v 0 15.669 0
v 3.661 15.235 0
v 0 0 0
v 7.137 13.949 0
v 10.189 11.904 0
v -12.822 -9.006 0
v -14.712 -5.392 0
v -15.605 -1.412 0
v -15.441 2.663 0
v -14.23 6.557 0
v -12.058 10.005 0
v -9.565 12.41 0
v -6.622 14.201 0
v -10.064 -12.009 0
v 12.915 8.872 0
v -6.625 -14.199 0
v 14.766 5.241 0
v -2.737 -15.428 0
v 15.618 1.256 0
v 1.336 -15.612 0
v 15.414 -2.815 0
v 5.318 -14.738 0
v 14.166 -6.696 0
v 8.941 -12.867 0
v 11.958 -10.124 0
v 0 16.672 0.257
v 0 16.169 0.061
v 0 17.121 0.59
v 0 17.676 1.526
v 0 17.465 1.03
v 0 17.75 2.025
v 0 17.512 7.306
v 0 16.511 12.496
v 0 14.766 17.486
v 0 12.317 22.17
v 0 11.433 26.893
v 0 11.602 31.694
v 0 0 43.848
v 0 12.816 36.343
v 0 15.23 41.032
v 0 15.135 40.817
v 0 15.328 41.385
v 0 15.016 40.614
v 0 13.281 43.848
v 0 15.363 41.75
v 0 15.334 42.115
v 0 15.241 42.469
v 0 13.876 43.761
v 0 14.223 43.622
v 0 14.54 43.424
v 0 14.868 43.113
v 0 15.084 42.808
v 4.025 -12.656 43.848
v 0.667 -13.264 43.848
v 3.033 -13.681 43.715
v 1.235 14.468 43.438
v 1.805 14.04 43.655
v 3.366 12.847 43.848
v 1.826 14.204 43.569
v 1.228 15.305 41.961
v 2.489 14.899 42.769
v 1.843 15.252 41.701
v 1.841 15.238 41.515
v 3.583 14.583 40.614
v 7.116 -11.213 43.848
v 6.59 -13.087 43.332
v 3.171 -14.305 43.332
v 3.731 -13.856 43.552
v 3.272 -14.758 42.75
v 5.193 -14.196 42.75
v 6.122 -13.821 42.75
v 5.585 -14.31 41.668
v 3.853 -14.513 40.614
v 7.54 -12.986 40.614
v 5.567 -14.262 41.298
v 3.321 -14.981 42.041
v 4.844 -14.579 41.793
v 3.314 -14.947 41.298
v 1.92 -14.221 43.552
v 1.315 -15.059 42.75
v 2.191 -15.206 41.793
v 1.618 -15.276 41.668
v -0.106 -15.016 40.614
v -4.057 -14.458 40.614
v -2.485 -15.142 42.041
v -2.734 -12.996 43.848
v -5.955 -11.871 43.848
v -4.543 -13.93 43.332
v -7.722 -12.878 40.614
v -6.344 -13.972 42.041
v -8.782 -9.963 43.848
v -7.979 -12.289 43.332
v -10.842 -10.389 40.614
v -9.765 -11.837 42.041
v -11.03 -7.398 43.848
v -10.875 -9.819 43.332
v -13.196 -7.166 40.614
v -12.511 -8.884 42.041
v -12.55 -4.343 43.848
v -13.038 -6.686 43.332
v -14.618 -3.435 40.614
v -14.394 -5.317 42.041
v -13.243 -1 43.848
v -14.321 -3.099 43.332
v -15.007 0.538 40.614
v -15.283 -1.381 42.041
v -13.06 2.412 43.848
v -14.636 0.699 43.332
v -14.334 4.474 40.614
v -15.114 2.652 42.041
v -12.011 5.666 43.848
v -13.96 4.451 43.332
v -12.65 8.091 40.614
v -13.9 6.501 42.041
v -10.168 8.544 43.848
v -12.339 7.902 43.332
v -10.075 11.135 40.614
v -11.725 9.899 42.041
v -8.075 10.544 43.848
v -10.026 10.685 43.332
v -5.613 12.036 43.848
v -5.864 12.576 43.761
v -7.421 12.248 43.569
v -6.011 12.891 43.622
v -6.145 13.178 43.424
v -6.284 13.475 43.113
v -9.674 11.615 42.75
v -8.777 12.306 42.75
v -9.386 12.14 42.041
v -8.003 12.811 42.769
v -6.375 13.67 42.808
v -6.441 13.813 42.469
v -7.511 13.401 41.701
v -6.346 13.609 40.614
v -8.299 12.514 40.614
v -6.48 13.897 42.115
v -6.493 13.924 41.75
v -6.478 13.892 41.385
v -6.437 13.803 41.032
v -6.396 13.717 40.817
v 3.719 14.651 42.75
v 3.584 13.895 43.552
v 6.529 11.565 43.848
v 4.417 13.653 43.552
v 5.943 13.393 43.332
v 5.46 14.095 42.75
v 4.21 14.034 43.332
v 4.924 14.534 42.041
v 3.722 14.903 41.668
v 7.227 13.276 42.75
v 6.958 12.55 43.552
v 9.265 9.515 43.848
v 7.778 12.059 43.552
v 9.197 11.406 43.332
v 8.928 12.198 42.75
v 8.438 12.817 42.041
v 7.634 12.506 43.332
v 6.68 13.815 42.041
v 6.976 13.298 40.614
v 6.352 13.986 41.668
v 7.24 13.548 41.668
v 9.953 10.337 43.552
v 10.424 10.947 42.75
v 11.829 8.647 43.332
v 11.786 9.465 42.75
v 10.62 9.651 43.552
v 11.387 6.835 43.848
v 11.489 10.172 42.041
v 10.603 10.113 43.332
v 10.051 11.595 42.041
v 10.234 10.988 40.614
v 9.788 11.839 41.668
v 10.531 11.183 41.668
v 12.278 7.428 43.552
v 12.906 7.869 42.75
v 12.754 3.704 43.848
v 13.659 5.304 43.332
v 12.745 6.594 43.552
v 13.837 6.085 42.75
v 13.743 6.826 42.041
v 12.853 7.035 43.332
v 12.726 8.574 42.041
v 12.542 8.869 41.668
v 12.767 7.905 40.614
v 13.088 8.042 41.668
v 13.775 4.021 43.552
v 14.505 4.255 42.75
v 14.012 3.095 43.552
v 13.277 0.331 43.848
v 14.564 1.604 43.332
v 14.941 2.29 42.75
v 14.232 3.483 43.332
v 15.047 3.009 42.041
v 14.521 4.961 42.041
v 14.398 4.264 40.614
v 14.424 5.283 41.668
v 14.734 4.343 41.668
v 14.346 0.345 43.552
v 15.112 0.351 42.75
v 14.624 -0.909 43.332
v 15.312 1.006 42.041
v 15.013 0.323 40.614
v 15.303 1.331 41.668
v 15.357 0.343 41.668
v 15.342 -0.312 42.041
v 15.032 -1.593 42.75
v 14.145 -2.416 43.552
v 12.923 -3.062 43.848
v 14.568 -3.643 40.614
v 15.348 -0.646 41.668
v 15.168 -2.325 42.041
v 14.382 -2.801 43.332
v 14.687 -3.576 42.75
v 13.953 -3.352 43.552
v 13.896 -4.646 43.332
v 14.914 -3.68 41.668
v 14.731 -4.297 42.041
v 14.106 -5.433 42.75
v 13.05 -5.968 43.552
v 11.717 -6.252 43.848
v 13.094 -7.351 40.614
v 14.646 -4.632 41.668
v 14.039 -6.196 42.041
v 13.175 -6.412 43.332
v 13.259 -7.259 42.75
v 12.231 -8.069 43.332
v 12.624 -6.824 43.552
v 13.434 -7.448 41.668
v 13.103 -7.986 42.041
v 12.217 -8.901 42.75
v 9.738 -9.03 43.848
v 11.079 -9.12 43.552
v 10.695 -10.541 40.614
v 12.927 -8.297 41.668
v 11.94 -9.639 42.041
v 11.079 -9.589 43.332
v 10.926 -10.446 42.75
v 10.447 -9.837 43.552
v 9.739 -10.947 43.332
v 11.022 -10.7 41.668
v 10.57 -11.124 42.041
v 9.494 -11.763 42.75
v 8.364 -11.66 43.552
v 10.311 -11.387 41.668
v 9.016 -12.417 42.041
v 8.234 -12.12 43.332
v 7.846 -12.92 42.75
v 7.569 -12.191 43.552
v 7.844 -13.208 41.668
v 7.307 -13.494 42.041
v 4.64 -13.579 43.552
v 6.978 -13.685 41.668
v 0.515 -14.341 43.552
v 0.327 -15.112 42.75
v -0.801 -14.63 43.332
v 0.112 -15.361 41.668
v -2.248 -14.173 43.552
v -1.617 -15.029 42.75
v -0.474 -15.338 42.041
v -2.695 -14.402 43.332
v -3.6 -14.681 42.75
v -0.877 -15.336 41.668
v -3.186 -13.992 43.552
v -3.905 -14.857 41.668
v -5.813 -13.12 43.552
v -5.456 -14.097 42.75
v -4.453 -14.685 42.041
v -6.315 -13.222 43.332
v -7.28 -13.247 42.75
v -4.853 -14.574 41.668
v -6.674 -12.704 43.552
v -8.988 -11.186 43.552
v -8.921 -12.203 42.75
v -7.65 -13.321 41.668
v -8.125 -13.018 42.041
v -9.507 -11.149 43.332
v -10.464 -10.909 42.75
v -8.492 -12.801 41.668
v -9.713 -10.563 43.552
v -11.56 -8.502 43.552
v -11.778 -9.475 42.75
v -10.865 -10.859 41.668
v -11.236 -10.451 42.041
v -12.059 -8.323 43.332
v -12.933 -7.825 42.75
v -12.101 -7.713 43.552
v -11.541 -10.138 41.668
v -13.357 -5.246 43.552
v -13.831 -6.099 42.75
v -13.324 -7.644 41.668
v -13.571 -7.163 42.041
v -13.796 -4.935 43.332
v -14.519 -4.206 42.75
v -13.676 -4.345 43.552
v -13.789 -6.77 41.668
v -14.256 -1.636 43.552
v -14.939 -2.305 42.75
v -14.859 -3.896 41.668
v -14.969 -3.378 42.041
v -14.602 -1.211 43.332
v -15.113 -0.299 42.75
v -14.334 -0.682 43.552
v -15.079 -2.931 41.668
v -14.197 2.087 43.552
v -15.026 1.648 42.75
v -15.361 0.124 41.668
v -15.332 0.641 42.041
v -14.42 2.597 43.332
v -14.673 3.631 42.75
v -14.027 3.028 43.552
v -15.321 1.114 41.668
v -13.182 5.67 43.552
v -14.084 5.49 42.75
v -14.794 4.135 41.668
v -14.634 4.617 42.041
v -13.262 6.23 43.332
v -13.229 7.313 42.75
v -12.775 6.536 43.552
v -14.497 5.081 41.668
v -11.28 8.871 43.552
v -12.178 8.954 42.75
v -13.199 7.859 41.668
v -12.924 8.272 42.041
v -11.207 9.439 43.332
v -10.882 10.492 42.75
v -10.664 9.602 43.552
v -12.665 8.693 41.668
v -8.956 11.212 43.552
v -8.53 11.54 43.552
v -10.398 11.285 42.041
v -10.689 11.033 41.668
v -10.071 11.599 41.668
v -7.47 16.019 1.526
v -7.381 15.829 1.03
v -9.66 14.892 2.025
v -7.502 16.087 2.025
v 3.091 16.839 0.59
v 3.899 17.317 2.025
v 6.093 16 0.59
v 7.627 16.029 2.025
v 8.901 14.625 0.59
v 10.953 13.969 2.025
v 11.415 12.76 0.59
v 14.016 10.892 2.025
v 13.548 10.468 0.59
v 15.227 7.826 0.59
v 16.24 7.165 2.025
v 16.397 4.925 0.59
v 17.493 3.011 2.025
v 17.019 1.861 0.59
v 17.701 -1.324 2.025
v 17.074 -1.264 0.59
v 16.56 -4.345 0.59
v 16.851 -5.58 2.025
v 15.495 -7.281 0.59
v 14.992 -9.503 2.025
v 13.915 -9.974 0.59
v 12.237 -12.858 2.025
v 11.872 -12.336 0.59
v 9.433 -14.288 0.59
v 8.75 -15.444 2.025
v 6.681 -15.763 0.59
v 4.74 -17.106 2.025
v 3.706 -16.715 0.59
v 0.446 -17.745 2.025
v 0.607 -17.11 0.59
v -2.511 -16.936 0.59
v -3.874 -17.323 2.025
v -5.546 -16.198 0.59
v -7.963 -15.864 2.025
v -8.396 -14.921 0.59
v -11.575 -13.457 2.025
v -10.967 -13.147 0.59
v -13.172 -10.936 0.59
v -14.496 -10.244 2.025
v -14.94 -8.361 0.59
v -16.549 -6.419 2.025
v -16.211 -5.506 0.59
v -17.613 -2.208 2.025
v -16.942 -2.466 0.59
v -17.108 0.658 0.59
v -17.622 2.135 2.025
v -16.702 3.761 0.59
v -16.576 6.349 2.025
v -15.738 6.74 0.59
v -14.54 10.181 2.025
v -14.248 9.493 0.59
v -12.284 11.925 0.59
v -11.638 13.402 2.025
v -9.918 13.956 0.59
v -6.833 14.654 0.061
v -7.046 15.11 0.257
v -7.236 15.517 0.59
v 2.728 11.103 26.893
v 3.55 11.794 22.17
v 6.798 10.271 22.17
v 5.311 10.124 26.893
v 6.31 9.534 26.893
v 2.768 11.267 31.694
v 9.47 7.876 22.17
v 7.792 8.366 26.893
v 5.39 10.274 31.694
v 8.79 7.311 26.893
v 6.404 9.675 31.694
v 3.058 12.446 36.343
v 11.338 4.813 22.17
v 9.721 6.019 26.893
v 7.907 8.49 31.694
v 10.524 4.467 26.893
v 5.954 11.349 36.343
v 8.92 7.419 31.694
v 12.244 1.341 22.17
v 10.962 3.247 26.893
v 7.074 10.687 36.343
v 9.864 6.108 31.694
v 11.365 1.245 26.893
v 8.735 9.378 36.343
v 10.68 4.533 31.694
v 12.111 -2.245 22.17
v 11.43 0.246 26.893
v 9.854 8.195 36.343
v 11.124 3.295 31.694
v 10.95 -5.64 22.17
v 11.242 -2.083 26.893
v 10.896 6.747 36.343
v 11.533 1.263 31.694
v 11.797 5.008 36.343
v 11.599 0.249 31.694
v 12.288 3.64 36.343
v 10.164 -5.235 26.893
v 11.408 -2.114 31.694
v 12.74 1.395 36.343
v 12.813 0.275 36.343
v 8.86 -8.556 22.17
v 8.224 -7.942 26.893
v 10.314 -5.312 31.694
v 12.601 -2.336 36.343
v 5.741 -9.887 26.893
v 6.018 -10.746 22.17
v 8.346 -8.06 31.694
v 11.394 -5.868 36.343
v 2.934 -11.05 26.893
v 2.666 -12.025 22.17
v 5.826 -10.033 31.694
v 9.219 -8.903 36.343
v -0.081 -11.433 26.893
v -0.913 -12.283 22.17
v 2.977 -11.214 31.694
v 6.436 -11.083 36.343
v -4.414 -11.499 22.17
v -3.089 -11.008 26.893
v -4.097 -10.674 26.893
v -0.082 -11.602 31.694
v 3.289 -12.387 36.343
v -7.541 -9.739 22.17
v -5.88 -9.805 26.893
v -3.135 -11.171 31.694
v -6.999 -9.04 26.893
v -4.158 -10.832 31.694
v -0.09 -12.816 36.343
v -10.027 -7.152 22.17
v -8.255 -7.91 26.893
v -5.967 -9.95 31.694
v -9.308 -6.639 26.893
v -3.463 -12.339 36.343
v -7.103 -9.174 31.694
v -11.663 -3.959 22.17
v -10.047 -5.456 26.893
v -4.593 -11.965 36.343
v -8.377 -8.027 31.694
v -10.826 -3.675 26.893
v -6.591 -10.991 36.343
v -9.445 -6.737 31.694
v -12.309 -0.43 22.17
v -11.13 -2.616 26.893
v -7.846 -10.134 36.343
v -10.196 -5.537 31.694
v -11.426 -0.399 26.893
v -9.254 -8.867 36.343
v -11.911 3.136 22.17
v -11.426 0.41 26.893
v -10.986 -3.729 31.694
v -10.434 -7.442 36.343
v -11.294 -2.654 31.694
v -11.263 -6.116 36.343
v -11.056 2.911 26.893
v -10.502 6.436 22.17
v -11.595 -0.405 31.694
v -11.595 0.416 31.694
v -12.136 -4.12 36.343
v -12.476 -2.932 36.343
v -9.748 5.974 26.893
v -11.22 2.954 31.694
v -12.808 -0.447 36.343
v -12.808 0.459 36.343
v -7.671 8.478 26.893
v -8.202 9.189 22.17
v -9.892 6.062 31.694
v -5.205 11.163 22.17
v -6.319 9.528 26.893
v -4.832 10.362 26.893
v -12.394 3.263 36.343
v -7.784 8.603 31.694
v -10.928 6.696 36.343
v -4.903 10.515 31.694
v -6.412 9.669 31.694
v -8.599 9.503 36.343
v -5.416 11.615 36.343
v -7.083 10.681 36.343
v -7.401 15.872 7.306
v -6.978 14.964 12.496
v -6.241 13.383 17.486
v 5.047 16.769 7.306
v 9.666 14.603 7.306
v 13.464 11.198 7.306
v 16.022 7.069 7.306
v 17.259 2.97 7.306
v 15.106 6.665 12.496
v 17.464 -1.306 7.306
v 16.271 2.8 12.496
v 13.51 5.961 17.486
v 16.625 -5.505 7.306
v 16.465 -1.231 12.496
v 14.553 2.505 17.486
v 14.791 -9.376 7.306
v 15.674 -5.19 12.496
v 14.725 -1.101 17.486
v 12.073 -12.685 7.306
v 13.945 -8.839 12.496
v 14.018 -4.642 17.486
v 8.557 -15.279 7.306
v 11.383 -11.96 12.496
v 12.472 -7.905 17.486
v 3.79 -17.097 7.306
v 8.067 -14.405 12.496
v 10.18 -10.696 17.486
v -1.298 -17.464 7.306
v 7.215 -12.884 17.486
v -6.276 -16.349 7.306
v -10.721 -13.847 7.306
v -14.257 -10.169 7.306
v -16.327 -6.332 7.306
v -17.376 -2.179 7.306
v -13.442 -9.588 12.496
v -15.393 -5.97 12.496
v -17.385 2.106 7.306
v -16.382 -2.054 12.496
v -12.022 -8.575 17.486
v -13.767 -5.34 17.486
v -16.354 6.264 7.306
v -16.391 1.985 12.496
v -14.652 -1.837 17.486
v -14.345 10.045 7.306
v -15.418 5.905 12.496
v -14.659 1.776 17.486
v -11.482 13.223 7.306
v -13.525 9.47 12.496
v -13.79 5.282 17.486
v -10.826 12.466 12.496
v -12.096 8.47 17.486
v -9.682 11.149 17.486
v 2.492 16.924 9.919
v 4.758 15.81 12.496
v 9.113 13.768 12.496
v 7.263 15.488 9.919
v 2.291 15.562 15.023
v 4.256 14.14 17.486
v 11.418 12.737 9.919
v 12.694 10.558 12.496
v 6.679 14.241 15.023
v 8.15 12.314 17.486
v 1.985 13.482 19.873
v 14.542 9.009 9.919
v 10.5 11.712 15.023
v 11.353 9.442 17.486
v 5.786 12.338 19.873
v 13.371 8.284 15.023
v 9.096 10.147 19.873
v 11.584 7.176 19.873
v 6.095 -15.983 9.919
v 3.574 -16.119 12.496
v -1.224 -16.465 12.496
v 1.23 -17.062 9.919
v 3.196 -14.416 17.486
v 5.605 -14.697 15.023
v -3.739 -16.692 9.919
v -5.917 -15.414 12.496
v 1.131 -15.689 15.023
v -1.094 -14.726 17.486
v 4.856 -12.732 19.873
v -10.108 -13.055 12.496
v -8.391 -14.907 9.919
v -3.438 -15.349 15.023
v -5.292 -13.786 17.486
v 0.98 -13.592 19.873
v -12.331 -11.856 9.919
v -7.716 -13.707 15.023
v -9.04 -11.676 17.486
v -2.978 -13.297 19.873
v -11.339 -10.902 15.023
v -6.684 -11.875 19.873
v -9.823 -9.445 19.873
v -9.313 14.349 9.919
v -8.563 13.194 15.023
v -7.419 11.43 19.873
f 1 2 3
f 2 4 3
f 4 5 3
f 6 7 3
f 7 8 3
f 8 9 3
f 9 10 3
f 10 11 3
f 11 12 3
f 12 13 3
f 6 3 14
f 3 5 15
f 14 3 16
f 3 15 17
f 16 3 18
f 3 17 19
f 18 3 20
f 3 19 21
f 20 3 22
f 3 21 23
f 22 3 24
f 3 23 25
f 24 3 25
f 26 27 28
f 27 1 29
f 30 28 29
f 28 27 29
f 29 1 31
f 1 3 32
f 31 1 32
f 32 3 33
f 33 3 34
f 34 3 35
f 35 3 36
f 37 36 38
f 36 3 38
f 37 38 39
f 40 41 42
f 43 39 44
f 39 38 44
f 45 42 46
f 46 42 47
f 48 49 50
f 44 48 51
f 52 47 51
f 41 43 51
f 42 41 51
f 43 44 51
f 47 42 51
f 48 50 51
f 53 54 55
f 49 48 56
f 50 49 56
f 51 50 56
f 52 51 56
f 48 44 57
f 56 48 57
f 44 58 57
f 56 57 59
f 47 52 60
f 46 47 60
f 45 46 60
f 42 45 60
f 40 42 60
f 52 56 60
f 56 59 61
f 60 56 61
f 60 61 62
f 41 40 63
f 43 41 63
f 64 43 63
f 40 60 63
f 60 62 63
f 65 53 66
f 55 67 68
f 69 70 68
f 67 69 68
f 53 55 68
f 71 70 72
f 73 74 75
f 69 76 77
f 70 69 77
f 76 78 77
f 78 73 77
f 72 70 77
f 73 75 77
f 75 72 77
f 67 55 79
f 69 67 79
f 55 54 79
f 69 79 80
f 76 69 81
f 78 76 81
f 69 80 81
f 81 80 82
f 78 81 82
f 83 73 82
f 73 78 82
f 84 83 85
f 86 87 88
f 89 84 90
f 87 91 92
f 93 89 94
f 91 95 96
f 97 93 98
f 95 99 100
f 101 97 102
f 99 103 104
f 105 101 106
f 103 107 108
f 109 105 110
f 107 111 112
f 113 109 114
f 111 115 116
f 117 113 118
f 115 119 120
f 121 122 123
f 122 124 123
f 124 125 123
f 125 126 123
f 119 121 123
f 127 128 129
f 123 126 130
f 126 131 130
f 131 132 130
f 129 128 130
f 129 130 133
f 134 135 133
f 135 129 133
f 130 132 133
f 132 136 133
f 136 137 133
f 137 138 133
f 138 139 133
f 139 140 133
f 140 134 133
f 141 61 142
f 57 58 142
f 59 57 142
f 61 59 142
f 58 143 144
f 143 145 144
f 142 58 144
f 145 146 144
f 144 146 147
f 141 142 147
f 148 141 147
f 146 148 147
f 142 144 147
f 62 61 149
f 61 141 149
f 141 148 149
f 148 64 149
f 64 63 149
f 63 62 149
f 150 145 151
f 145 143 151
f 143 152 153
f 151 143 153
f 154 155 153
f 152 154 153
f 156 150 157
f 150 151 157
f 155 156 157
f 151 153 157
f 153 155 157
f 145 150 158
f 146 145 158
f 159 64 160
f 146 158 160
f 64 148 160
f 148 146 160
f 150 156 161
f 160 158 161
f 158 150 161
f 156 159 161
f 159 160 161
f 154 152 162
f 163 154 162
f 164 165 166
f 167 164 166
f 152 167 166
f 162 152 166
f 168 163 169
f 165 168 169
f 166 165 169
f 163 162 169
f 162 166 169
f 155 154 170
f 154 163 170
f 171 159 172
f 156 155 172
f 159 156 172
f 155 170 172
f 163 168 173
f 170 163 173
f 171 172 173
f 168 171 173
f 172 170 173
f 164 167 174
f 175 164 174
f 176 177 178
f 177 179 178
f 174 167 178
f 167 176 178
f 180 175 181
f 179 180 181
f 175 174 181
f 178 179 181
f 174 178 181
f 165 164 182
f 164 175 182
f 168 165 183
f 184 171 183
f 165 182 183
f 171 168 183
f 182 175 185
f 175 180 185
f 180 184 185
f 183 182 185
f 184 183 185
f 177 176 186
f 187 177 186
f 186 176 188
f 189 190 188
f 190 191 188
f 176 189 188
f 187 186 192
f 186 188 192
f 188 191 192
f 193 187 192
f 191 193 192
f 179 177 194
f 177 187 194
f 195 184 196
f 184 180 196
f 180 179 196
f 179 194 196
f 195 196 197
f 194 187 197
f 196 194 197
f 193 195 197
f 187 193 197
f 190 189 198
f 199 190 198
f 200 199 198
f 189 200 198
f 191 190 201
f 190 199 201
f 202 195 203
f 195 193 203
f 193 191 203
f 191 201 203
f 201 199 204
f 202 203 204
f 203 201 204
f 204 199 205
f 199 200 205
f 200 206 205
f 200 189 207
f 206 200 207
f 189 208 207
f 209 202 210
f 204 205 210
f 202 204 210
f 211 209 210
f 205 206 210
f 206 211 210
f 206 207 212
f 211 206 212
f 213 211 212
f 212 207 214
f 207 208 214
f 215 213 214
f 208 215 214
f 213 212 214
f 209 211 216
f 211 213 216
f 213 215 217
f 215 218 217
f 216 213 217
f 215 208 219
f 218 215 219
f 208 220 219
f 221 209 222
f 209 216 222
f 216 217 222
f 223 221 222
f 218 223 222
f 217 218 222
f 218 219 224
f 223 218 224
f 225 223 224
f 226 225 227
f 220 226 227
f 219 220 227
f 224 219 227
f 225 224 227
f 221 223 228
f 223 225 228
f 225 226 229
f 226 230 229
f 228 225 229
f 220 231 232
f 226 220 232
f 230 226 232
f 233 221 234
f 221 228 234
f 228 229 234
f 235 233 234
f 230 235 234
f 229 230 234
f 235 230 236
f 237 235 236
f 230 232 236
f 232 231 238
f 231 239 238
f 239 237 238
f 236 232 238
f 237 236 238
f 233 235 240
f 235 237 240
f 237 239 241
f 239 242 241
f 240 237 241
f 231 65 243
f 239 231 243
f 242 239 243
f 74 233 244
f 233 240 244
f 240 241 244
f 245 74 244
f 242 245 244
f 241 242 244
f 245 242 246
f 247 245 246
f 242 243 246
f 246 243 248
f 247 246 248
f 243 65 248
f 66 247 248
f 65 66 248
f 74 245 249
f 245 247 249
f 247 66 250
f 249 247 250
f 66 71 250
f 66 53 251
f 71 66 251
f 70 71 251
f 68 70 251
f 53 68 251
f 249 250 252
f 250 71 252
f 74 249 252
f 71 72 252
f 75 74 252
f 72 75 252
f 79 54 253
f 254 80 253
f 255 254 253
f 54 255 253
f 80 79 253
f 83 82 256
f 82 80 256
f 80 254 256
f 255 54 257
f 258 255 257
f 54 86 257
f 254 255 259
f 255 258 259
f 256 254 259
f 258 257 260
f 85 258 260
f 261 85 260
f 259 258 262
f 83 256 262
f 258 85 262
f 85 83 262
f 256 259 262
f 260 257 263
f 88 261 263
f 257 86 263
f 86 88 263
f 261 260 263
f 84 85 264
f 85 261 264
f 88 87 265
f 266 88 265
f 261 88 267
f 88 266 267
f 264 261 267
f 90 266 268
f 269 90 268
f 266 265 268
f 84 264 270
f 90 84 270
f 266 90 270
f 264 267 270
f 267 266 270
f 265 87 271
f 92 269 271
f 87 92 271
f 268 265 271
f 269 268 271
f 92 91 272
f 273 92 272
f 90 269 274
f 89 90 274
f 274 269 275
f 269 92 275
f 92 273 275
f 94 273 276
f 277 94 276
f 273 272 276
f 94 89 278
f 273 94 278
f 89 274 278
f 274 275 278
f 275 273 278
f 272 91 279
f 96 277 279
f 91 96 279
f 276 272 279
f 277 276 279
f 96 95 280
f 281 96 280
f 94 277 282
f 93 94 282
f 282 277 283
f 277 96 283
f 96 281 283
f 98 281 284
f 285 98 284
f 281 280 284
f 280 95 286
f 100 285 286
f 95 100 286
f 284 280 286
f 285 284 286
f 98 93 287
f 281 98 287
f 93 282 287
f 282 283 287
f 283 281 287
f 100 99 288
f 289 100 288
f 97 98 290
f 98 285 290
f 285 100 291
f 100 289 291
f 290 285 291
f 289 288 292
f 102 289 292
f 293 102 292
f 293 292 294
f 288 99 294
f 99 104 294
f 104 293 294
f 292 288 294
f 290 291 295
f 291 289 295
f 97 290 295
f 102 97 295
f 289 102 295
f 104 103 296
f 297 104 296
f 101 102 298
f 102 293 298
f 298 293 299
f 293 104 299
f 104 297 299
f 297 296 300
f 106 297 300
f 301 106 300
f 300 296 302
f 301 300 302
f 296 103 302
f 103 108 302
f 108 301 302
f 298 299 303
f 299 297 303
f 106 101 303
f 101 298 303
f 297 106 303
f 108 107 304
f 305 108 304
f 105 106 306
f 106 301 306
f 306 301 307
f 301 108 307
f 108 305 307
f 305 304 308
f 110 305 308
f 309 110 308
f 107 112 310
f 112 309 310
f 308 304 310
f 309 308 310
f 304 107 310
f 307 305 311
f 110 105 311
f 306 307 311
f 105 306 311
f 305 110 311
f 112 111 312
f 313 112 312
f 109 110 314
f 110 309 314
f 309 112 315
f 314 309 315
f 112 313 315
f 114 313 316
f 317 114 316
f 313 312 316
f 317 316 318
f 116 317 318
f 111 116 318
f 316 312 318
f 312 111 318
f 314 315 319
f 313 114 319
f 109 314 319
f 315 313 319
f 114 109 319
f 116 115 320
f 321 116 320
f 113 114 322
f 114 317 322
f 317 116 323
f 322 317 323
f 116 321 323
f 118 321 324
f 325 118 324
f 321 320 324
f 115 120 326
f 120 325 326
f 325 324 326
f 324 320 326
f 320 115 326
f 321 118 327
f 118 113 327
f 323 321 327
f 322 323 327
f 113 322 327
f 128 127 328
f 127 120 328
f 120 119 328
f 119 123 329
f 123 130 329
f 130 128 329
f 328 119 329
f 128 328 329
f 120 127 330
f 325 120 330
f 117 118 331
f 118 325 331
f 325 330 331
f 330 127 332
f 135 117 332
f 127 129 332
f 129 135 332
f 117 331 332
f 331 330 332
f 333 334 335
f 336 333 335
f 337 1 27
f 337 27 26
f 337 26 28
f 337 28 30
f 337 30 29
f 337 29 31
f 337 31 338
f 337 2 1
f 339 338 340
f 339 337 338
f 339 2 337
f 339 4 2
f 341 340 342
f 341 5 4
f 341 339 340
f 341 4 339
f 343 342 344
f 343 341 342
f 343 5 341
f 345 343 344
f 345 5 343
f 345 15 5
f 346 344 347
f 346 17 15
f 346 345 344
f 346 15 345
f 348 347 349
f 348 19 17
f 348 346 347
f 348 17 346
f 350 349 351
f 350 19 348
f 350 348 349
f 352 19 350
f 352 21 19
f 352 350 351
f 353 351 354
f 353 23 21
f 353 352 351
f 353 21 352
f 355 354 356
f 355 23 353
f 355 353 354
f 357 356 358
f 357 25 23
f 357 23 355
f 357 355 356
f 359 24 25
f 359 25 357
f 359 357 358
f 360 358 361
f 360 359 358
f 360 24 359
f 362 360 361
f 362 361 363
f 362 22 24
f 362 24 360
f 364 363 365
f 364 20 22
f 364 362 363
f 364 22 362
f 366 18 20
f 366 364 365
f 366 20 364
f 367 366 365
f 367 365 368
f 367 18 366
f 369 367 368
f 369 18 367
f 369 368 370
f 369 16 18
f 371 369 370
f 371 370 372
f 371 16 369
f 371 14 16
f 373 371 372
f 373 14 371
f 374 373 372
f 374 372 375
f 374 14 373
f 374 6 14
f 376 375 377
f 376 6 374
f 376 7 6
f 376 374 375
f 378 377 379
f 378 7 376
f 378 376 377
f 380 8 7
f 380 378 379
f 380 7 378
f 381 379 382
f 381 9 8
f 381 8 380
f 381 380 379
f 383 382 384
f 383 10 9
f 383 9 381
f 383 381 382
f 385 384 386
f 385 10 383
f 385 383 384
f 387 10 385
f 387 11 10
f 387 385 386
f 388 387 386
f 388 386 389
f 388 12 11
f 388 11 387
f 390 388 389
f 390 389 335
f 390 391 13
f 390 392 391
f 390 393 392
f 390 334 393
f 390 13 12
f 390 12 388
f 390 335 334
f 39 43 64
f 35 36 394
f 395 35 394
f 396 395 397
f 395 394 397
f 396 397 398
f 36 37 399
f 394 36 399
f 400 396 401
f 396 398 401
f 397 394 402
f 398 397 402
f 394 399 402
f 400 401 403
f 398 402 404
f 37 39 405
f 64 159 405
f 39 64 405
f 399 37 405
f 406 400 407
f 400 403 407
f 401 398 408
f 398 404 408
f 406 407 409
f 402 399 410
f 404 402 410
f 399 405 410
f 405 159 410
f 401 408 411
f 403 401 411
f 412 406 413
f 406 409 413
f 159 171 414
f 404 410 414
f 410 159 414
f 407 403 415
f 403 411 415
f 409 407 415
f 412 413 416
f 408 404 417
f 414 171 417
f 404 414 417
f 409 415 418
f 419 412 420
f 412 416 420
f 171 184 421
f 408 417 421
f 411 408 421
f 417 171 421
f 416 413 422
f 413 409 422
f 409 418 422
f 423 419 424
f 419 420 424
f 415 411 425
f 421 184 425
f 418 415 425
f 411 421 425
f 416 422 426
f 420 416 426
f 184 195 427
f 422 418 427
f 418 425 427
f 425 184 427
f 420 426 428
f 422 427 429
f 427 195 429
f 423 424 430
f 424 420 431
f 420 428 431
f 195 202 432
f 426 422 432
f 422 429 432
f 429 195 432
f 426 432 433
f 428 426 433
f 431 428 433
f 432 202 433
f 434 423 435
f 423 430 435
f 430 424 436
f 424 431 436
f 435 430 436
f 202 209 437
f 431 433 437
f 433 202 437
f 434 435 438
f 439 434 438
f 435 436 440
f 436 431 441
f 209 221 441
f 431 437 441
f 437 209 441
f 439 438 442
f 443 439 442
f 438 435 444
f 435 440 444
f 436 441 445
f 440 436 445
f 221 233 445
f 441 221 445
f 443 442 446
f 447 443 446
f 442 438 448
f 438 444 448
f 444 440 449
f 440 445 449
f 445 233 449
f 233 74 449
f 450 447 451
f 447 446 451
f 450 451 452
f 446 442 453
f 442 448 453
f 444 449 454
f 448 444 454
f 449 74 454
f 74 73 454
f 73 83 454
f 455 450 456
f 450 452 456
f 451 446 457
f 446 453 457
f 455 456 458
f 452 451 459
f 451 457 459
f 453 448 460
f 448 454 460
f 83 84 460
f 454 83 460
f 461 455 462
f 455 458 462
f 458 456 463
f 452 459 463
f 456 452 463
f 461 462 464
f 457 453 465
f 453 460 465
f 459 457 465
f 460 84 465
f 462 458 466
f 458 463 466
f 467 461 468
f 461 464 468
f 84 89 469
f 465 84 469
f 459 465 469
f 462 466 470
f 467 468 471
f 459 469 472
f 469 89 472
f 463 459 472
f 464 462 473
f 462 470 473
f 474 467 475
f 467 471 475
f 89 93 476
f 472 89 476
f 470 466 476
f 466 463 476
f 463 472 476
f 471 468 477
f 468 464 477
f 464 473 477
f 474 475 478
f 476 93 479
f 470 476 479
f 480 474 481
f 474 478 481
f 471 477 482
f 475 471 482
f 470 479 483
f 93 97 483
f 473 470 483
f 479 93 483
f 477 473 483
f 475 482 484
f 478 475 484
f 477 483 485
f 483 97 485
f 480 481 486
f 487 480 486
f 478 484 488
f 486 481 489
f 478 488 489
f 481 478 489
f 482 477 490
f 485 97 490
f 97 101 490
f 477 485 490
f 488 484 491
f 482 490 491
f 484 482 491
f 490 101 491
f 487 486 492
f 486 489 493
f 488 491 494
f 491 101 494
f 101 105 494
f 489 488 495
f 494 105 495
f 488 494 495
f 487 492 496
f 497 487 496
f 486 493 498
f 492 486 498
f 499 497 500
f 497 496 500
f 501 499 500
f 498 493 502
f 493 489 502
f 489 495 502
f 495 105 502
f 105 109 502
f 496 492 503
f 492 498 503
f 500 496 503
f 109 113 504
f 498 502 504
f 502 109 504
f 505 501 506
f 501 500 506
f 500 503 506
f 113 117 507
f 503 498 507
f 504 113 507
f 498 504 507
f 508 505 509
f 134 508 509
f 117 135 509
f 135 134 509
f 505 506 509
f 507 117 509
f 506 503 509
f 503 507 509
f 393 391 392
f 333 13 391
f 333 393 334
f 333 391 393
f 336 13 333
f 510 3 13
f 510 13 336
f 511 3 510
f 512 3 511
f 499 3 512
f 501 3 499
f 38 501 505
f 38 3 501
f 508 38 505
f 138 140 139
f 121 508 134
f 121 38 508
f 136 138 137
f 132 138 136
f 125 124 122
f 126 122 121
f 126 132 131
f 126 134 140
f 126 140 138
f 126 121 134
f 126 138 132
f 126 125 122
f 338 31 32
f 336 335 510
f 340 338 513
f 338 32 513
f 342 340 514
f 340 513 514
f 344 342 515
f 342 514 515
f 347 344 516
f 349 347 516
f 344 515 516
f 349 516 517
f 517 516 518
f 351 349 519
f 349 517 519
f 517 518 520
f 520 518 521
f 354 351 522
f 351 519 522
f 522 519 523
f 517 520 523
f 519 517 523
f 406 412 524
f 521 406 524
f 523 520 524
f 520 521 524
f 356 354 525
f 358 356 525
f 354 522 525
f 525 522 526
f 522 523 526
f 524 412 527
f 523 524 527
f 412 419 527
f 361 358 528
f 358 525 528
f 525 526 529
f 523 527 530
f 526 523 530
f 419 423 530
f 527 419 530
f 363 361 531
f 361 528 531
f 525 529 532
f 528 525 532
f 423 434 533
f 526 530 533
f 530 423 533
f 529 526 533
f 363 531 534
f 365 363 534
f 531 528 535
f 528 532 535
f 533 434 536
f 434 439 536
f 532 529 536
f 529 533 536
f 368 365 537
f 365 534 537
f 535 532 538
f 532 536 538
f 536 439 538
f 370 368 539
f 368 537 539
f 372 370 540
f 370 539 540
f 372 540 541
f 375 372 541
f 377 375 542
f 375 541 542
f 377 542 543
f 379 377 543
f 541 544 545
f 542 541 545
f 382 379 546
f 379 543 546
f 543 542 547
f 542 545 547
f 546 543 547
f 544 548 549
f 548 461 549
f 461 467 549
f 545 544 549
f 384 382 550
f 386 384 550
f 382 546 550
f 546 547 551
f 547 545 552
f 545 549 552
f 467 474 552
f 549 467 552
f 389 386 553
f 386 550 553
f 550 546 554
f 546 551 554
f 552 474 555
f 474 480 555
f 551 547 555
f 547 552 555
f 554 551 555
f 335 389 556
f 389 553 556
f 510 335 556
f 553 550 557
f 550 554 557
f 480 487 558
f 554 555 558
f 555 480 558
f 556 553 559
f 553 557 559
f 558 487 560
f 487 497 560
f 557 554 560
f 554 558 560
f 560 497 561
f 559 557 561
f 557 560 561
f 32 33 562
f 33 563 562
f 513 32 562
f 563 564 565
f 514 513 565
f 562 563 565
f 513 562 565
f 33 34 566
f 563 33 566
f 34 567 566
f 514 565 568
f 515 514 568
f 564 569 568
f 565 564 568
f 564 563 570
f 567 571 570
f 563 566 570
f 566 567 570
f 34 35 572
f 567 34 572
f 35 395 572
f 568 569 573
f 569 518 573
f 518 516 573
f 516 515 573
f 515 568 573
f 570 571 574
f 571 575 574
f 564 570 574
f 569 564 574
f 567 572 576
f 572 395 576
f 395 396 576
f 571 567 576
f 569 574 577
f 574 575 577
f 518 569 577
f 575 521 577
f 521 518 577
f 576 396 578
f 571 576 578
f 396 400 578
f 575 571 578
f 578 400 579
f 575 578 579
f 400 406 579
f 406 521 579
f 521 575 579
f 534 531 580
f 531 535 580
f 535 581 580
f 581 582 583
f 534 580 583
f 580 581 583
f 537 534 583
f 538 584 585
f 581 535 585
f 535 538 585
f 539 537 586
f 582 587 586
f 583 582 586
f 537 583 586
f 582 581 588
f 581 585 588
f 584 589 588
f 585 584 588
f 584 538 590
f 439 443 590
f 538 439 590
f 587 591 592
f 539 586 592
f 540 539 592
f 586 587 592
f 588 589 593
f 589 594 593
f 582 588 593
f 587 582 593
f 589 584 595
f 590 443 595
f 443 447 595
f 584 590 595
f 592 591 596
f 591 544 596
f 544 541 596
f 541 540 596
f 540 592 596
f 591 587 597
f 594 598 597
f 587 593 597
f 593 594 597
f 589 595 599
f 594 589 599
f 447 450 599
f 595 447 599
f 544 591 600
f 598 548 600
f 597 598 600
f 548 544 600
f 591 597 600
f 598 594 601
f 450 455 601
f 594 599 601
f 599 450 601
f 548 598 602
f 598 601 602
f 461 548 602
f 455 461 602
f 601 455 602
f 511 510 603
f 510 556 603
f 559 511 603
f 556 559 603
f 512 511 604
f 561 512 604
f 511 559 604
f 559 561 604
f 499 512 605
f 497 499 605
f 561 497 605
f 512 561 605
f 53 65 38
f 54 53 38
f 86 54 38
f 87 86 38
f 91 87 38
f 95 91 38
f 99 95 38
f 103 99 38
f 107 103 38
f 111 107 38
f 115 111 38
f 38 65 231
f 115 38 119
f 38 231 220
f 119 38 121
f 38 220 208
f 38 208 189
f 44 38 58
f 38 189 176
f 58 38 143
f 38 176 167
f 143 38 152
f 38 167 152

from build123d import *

# Parameters (mm, degrees)
F1_ANGLE = 335
F2_R     = 2.082692


with BuildPart() as f1:
    # F0 (on Right) → F1 (revolve)
    with BuildSketch(Plane.YZ):
        with BuildLine():
            Line((17.637674, 43.847844), (0, 43.847844))
            Line((0, 43.847844), (0, 0))
            Line((0, 0), (17.637674, 0))
            ThreePointArc((17.637674, 0), (16.761053, 11.513244), (12.316811, 22.170259))
            ThreePointArc((12.316811, 22.170259), (12.001861, 33.739372), (17.637674, 43.847844))
        make_face()
    revolve(axis=Axis((0, 0, 21.923922), (0, 0, -1)), revolution_arc=F1_ANGLE)

    # F2
    f2_edges = [f1.edges().sort_by_distance(p)[0] for p in [
        (3.817491, -17.21959, 43.847844),
        (3.817491, -17.21959, 0),
    ]]
    fillet(f2_edges, radius=F2_R)


solid = f1.part
